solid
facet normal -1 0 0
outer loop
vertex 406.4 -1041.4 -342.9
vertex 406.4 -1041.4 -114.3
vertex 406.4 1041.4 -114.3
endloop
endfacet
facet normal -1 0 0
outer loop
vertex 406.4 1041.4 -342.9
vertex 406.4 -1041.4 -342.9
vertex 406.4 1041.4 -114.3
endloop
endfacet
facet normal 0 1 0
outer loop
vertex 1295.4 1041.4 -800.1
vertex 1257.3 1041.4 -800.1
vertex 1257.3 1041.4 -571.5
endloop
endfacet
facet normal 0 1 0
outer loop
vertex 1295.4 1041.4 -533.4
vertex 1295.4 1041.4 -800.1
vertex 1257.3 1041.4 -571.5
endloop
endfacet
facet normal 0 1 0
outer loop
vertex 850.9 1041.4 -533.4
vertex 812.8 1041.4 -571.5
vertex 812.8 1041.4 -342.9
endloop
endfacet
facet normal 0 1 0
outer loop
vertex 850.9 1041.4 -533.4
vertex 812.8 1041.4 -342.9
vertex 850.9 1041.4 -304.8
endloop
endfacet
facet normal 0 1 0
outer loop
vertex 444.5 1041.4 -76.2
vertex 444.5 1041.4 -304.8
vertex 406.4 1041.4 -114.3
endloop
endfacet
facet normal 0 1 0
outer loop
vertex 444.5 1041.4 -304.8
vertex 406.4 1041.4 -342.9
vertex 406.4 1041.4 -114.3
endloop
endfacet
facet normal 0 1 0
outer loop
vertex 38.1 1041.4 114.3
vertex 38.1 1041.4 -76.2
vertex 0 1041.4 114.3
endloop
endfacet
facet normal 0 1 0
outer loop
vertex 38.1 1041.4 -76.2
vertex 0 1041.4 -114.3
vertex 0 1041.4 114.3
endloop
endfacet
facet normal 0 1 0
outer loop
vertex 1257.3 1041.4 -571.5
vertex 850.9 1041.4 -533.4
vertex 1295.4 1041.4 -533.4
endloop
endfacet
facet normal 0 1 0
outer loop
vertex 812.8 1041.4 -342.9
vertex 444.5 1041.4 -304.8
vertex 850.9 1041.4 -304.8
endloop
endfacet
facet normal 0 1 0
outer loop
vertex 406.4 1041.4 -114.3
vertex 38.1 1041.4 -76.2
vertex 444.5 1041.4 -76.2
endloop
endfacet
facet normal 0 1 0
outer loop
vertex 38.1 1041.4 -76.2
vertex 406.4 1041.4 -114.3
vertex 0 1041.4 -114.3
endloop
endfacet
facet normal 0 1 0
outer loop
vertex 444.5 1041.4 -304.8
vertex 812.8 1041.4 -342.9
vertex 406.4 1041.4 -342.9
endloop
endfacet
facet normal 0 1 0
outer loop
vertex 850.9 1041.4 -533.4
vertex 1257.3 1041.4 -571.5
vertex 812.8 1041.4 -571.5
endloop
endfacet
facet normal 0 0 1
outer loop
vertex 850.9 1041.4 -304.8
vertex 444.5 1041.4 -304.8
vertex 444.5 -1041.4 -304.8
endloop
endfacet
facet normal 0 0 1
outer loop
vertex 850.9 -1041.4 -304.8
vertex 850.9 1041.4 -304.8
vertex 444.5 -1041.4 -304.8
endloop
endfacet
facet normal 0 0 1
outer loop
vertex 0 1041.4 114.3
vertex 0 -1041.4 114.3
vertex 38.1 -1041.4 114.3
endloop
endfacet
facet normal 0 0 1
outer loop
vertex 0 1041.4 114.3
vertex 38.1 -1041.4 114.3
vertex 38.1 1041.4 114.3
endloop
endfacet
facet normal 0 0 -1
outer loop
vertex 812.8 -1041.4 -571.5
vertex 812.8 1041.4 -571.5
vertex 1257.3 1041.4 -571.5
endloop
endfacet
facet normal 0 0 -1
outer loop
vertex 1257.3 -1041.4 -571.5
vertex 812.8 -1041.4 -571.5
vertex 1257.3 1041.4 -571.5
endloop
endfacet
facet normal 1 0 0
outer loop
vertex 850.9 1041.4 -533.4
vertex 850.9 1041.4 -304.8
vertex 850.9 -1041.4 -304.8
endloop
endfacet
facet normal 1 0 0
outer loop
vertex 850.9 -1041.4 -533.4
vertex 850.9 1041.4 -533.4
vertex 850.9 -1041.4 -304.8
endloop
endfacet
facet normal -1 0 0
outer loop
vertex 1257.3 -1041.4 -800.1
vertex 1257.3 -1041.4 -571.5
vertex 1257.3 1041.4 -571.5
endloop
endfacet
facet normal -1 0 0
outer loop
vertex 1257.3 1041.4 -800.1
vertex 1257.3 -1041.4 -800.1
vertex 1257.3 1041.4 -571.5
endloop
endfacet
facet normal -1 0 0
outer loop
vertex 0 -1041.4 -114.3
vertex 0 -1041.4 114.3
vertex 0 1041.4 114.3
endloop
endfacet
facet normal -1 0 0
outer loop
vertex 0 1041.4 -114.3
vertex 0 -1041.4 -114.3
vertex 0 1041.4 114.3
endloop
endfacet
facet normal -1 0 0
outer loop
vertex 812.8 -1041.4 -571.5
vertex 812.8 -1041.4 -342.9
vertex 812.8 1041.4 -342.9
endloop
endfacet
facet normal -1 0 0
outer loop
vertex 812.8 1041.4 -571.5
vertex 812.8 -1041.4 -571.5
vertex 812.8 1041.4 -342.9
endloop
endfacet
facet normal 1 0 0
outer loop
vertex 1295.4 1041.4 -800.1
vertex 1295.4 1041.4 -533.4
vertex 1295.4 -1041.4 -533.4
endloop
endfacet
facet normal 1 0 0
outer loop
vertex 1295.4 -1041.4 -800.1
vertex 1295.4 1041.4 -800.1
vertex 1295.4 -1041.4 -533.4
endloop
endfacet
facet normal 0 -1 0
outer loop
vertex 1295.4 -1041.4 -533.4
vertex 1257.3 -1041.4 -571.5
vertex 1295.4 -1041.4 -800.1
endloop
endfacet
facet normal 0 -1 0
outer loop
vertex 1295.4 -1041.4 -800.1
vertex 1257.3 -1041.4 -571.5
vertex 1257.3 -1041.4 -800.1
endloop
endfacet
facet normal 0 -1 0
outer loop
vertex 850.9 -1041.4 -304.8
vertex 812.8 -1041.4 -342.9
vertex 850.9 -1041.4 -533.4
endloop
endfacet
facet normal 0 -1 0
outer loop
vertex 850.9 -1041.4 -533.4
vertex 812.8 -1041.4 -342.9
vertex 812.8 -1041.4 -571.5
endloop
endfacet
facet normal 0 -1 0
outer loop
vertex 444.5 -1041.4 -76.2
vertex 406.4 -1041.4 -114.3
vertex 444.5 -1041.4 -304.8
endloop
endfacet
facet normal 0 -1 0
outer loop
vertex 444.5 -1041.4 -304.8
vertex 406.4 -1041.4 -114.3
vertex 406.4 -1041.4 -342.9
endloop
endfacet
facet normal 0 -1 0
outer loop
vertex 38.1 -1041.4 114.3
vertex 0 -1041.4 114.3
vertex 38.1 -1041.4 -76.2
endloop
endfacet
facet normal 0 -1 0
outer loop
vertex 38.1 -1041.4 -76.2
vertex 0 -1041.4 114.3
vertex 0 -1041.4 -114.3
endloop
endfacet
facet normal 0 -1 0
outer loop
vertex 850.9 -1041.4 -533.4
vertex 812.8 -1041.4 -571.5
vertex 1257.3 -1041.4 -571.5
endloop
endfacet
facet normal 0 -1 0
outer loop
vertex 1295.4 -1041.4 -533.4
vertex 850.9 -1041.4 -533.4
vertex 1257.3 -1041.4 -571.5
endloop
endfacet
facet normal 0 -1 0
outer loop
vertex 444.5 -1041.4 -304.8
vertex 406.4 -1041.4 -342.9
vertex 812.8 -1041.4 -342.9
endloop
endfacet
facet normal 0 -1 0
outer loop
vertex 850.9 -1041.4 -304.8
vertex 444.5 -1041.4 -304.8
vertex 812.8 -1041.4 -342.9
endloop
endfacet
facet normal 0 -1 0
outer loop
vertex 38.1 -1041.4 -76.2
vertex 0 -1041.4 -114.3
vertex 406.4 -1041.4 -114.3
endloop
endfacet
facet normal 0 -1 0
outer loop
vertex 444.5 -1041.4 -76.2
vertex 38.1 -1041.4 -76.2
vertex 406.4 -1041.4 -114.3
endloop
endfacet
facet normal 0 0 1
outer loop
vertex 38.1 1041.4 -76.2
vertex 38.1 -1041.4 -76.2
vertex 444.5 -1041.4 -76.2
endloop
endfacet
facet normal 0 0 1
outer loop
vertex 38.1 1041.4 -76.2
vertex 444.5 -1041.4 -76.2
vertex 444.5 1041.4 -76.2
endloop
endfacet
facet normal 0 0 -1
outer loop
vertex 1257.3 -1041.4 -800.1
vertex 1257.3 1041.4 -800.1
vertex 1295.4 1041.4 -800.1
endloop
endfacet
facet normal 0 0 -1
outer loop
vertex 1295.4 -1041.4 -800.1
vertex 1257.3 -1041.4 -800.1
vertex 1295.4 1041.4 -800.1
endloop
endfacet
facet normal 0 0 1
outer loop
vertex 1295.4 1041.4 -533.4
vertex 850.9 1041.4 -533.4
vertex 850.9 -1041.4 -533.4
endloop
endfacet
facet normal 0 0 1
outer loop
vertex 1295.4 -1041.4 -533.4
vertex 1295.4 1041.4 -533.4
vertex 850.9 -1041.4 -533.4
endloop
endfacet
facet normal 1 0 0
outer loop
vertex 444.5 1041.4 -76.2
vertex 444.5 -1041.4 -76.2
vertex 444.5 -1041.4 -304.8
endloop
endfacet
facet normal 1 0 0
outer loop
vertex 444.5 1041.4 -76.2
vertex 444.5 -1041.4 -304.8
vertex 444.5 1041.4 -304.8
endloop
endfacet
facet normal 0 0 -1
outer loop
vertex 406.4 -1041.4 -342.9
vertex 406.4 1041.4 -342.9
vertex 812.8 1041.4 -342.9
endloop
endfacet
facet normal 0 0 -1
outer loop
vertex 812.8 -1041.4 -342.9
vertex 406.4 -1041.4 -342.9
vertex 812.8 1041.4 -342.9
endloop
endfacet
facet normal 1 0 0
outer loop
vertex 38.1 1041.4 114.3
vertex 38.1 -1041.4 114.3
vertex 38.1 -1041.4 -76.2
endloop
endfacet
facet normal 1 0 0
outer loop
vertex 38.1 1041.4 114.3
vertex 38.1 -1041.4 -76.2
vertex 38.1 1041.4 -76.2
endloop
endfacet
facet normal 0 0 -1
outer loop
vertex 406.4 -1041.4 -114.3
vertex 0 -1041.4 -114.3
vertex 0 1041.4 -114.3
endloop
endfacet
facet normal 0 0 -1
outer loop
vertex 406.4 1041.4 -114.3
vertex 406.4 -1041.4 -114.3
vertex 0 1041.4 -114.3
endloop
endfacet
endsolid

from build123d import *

# Parameters (mm, degrees)
F0_W      = 2082.8
F0_H      = 190.5
F0_H_2    = 38.1
F1_DEPTH  = 38.1
F2_DEPTH  = 444.5
F3_W      = 38.1
F3_H      = 2082.8
F4_DEPTH  = 266.7
F5_W      = 2082.8
F5_H      = 38.1
F6_DEPTH  = 444.5
F7_W      = 38.1
F7_H      = 2082.8
F8_DEPTH  = 266.7
F9_W      = 2082.8
F9_H      = 38.1
F10_DEPTH = 482.6
F11_W     = 38.1
F11_H     = 2082.8
F12_DEPTH = 266.7


with BuildPart() as f1:
    # F0 (on Right) → F1 (new body)
    with BuildSketch(Plane.YZ):
        with Locations((0, 19.05)):
            Rectangle(F0_W, F0_H)
        with Locations((0, -95.25)):
            Rectangle(F0_W, F0_H_2)
    extrude(amount=F1_DEPTH)

    # F0 (on Right) → F2 (join)
    with BuildSketch(Plane.YZ):
        with Locations((0, -95.25)):
            Rectangle(F0_W, F0_H_2)
    extrude(amount=F2_DEPTH)

    # F3 (on face) → F4 (join)
    with BuildSketch(Plane.XY.offset(-76.2)):
        with Locations((425.45, 0)):
            Rectangle(F3_W, F3_H)
    extrude(amount=-F4_DEPTH)

    # F5 (on face) → F6 (join)
    with BuildSketch(Plane(origin=(406.4, 0, 0), x_dir=(0, -1, 0), z_dir=(-1, 0, 0))):
        with Locations((0, -323.85)):
            Rectangle(F5_W, F5_H)
    extrude(amount=-F6_DEPTH)

    # F7 (on face) → F8 (join)
    with BuildSketch(Plane.XY.offset(-304.8)):
        with Locations((831.85, 0)):
            Rectangle(F7_W, F7_H)
    extrude(amount=-F8_DEPTH)

    # F9 (on face) → F10 (join)
    with BuildSketch(Plane(origin=(812.8, 0, 0), x_dir=(0, -1, 0), z_dir=(-1, 0, 0))):
        with Locations((0, -552.45)):
            Rectangle(F9_W, F9_H)
    extrude(amount=-F10_DEPTH)

    # F11 (on face) → F12 (join)
    with BuildSketch(Plane.XY.offset(-533.4)):
        with Locations((1276.35, 0)):
            Rectangle(F11_W, F11_H)
    extrude(amount=-F12_DEPTH)


solid = f1.part
